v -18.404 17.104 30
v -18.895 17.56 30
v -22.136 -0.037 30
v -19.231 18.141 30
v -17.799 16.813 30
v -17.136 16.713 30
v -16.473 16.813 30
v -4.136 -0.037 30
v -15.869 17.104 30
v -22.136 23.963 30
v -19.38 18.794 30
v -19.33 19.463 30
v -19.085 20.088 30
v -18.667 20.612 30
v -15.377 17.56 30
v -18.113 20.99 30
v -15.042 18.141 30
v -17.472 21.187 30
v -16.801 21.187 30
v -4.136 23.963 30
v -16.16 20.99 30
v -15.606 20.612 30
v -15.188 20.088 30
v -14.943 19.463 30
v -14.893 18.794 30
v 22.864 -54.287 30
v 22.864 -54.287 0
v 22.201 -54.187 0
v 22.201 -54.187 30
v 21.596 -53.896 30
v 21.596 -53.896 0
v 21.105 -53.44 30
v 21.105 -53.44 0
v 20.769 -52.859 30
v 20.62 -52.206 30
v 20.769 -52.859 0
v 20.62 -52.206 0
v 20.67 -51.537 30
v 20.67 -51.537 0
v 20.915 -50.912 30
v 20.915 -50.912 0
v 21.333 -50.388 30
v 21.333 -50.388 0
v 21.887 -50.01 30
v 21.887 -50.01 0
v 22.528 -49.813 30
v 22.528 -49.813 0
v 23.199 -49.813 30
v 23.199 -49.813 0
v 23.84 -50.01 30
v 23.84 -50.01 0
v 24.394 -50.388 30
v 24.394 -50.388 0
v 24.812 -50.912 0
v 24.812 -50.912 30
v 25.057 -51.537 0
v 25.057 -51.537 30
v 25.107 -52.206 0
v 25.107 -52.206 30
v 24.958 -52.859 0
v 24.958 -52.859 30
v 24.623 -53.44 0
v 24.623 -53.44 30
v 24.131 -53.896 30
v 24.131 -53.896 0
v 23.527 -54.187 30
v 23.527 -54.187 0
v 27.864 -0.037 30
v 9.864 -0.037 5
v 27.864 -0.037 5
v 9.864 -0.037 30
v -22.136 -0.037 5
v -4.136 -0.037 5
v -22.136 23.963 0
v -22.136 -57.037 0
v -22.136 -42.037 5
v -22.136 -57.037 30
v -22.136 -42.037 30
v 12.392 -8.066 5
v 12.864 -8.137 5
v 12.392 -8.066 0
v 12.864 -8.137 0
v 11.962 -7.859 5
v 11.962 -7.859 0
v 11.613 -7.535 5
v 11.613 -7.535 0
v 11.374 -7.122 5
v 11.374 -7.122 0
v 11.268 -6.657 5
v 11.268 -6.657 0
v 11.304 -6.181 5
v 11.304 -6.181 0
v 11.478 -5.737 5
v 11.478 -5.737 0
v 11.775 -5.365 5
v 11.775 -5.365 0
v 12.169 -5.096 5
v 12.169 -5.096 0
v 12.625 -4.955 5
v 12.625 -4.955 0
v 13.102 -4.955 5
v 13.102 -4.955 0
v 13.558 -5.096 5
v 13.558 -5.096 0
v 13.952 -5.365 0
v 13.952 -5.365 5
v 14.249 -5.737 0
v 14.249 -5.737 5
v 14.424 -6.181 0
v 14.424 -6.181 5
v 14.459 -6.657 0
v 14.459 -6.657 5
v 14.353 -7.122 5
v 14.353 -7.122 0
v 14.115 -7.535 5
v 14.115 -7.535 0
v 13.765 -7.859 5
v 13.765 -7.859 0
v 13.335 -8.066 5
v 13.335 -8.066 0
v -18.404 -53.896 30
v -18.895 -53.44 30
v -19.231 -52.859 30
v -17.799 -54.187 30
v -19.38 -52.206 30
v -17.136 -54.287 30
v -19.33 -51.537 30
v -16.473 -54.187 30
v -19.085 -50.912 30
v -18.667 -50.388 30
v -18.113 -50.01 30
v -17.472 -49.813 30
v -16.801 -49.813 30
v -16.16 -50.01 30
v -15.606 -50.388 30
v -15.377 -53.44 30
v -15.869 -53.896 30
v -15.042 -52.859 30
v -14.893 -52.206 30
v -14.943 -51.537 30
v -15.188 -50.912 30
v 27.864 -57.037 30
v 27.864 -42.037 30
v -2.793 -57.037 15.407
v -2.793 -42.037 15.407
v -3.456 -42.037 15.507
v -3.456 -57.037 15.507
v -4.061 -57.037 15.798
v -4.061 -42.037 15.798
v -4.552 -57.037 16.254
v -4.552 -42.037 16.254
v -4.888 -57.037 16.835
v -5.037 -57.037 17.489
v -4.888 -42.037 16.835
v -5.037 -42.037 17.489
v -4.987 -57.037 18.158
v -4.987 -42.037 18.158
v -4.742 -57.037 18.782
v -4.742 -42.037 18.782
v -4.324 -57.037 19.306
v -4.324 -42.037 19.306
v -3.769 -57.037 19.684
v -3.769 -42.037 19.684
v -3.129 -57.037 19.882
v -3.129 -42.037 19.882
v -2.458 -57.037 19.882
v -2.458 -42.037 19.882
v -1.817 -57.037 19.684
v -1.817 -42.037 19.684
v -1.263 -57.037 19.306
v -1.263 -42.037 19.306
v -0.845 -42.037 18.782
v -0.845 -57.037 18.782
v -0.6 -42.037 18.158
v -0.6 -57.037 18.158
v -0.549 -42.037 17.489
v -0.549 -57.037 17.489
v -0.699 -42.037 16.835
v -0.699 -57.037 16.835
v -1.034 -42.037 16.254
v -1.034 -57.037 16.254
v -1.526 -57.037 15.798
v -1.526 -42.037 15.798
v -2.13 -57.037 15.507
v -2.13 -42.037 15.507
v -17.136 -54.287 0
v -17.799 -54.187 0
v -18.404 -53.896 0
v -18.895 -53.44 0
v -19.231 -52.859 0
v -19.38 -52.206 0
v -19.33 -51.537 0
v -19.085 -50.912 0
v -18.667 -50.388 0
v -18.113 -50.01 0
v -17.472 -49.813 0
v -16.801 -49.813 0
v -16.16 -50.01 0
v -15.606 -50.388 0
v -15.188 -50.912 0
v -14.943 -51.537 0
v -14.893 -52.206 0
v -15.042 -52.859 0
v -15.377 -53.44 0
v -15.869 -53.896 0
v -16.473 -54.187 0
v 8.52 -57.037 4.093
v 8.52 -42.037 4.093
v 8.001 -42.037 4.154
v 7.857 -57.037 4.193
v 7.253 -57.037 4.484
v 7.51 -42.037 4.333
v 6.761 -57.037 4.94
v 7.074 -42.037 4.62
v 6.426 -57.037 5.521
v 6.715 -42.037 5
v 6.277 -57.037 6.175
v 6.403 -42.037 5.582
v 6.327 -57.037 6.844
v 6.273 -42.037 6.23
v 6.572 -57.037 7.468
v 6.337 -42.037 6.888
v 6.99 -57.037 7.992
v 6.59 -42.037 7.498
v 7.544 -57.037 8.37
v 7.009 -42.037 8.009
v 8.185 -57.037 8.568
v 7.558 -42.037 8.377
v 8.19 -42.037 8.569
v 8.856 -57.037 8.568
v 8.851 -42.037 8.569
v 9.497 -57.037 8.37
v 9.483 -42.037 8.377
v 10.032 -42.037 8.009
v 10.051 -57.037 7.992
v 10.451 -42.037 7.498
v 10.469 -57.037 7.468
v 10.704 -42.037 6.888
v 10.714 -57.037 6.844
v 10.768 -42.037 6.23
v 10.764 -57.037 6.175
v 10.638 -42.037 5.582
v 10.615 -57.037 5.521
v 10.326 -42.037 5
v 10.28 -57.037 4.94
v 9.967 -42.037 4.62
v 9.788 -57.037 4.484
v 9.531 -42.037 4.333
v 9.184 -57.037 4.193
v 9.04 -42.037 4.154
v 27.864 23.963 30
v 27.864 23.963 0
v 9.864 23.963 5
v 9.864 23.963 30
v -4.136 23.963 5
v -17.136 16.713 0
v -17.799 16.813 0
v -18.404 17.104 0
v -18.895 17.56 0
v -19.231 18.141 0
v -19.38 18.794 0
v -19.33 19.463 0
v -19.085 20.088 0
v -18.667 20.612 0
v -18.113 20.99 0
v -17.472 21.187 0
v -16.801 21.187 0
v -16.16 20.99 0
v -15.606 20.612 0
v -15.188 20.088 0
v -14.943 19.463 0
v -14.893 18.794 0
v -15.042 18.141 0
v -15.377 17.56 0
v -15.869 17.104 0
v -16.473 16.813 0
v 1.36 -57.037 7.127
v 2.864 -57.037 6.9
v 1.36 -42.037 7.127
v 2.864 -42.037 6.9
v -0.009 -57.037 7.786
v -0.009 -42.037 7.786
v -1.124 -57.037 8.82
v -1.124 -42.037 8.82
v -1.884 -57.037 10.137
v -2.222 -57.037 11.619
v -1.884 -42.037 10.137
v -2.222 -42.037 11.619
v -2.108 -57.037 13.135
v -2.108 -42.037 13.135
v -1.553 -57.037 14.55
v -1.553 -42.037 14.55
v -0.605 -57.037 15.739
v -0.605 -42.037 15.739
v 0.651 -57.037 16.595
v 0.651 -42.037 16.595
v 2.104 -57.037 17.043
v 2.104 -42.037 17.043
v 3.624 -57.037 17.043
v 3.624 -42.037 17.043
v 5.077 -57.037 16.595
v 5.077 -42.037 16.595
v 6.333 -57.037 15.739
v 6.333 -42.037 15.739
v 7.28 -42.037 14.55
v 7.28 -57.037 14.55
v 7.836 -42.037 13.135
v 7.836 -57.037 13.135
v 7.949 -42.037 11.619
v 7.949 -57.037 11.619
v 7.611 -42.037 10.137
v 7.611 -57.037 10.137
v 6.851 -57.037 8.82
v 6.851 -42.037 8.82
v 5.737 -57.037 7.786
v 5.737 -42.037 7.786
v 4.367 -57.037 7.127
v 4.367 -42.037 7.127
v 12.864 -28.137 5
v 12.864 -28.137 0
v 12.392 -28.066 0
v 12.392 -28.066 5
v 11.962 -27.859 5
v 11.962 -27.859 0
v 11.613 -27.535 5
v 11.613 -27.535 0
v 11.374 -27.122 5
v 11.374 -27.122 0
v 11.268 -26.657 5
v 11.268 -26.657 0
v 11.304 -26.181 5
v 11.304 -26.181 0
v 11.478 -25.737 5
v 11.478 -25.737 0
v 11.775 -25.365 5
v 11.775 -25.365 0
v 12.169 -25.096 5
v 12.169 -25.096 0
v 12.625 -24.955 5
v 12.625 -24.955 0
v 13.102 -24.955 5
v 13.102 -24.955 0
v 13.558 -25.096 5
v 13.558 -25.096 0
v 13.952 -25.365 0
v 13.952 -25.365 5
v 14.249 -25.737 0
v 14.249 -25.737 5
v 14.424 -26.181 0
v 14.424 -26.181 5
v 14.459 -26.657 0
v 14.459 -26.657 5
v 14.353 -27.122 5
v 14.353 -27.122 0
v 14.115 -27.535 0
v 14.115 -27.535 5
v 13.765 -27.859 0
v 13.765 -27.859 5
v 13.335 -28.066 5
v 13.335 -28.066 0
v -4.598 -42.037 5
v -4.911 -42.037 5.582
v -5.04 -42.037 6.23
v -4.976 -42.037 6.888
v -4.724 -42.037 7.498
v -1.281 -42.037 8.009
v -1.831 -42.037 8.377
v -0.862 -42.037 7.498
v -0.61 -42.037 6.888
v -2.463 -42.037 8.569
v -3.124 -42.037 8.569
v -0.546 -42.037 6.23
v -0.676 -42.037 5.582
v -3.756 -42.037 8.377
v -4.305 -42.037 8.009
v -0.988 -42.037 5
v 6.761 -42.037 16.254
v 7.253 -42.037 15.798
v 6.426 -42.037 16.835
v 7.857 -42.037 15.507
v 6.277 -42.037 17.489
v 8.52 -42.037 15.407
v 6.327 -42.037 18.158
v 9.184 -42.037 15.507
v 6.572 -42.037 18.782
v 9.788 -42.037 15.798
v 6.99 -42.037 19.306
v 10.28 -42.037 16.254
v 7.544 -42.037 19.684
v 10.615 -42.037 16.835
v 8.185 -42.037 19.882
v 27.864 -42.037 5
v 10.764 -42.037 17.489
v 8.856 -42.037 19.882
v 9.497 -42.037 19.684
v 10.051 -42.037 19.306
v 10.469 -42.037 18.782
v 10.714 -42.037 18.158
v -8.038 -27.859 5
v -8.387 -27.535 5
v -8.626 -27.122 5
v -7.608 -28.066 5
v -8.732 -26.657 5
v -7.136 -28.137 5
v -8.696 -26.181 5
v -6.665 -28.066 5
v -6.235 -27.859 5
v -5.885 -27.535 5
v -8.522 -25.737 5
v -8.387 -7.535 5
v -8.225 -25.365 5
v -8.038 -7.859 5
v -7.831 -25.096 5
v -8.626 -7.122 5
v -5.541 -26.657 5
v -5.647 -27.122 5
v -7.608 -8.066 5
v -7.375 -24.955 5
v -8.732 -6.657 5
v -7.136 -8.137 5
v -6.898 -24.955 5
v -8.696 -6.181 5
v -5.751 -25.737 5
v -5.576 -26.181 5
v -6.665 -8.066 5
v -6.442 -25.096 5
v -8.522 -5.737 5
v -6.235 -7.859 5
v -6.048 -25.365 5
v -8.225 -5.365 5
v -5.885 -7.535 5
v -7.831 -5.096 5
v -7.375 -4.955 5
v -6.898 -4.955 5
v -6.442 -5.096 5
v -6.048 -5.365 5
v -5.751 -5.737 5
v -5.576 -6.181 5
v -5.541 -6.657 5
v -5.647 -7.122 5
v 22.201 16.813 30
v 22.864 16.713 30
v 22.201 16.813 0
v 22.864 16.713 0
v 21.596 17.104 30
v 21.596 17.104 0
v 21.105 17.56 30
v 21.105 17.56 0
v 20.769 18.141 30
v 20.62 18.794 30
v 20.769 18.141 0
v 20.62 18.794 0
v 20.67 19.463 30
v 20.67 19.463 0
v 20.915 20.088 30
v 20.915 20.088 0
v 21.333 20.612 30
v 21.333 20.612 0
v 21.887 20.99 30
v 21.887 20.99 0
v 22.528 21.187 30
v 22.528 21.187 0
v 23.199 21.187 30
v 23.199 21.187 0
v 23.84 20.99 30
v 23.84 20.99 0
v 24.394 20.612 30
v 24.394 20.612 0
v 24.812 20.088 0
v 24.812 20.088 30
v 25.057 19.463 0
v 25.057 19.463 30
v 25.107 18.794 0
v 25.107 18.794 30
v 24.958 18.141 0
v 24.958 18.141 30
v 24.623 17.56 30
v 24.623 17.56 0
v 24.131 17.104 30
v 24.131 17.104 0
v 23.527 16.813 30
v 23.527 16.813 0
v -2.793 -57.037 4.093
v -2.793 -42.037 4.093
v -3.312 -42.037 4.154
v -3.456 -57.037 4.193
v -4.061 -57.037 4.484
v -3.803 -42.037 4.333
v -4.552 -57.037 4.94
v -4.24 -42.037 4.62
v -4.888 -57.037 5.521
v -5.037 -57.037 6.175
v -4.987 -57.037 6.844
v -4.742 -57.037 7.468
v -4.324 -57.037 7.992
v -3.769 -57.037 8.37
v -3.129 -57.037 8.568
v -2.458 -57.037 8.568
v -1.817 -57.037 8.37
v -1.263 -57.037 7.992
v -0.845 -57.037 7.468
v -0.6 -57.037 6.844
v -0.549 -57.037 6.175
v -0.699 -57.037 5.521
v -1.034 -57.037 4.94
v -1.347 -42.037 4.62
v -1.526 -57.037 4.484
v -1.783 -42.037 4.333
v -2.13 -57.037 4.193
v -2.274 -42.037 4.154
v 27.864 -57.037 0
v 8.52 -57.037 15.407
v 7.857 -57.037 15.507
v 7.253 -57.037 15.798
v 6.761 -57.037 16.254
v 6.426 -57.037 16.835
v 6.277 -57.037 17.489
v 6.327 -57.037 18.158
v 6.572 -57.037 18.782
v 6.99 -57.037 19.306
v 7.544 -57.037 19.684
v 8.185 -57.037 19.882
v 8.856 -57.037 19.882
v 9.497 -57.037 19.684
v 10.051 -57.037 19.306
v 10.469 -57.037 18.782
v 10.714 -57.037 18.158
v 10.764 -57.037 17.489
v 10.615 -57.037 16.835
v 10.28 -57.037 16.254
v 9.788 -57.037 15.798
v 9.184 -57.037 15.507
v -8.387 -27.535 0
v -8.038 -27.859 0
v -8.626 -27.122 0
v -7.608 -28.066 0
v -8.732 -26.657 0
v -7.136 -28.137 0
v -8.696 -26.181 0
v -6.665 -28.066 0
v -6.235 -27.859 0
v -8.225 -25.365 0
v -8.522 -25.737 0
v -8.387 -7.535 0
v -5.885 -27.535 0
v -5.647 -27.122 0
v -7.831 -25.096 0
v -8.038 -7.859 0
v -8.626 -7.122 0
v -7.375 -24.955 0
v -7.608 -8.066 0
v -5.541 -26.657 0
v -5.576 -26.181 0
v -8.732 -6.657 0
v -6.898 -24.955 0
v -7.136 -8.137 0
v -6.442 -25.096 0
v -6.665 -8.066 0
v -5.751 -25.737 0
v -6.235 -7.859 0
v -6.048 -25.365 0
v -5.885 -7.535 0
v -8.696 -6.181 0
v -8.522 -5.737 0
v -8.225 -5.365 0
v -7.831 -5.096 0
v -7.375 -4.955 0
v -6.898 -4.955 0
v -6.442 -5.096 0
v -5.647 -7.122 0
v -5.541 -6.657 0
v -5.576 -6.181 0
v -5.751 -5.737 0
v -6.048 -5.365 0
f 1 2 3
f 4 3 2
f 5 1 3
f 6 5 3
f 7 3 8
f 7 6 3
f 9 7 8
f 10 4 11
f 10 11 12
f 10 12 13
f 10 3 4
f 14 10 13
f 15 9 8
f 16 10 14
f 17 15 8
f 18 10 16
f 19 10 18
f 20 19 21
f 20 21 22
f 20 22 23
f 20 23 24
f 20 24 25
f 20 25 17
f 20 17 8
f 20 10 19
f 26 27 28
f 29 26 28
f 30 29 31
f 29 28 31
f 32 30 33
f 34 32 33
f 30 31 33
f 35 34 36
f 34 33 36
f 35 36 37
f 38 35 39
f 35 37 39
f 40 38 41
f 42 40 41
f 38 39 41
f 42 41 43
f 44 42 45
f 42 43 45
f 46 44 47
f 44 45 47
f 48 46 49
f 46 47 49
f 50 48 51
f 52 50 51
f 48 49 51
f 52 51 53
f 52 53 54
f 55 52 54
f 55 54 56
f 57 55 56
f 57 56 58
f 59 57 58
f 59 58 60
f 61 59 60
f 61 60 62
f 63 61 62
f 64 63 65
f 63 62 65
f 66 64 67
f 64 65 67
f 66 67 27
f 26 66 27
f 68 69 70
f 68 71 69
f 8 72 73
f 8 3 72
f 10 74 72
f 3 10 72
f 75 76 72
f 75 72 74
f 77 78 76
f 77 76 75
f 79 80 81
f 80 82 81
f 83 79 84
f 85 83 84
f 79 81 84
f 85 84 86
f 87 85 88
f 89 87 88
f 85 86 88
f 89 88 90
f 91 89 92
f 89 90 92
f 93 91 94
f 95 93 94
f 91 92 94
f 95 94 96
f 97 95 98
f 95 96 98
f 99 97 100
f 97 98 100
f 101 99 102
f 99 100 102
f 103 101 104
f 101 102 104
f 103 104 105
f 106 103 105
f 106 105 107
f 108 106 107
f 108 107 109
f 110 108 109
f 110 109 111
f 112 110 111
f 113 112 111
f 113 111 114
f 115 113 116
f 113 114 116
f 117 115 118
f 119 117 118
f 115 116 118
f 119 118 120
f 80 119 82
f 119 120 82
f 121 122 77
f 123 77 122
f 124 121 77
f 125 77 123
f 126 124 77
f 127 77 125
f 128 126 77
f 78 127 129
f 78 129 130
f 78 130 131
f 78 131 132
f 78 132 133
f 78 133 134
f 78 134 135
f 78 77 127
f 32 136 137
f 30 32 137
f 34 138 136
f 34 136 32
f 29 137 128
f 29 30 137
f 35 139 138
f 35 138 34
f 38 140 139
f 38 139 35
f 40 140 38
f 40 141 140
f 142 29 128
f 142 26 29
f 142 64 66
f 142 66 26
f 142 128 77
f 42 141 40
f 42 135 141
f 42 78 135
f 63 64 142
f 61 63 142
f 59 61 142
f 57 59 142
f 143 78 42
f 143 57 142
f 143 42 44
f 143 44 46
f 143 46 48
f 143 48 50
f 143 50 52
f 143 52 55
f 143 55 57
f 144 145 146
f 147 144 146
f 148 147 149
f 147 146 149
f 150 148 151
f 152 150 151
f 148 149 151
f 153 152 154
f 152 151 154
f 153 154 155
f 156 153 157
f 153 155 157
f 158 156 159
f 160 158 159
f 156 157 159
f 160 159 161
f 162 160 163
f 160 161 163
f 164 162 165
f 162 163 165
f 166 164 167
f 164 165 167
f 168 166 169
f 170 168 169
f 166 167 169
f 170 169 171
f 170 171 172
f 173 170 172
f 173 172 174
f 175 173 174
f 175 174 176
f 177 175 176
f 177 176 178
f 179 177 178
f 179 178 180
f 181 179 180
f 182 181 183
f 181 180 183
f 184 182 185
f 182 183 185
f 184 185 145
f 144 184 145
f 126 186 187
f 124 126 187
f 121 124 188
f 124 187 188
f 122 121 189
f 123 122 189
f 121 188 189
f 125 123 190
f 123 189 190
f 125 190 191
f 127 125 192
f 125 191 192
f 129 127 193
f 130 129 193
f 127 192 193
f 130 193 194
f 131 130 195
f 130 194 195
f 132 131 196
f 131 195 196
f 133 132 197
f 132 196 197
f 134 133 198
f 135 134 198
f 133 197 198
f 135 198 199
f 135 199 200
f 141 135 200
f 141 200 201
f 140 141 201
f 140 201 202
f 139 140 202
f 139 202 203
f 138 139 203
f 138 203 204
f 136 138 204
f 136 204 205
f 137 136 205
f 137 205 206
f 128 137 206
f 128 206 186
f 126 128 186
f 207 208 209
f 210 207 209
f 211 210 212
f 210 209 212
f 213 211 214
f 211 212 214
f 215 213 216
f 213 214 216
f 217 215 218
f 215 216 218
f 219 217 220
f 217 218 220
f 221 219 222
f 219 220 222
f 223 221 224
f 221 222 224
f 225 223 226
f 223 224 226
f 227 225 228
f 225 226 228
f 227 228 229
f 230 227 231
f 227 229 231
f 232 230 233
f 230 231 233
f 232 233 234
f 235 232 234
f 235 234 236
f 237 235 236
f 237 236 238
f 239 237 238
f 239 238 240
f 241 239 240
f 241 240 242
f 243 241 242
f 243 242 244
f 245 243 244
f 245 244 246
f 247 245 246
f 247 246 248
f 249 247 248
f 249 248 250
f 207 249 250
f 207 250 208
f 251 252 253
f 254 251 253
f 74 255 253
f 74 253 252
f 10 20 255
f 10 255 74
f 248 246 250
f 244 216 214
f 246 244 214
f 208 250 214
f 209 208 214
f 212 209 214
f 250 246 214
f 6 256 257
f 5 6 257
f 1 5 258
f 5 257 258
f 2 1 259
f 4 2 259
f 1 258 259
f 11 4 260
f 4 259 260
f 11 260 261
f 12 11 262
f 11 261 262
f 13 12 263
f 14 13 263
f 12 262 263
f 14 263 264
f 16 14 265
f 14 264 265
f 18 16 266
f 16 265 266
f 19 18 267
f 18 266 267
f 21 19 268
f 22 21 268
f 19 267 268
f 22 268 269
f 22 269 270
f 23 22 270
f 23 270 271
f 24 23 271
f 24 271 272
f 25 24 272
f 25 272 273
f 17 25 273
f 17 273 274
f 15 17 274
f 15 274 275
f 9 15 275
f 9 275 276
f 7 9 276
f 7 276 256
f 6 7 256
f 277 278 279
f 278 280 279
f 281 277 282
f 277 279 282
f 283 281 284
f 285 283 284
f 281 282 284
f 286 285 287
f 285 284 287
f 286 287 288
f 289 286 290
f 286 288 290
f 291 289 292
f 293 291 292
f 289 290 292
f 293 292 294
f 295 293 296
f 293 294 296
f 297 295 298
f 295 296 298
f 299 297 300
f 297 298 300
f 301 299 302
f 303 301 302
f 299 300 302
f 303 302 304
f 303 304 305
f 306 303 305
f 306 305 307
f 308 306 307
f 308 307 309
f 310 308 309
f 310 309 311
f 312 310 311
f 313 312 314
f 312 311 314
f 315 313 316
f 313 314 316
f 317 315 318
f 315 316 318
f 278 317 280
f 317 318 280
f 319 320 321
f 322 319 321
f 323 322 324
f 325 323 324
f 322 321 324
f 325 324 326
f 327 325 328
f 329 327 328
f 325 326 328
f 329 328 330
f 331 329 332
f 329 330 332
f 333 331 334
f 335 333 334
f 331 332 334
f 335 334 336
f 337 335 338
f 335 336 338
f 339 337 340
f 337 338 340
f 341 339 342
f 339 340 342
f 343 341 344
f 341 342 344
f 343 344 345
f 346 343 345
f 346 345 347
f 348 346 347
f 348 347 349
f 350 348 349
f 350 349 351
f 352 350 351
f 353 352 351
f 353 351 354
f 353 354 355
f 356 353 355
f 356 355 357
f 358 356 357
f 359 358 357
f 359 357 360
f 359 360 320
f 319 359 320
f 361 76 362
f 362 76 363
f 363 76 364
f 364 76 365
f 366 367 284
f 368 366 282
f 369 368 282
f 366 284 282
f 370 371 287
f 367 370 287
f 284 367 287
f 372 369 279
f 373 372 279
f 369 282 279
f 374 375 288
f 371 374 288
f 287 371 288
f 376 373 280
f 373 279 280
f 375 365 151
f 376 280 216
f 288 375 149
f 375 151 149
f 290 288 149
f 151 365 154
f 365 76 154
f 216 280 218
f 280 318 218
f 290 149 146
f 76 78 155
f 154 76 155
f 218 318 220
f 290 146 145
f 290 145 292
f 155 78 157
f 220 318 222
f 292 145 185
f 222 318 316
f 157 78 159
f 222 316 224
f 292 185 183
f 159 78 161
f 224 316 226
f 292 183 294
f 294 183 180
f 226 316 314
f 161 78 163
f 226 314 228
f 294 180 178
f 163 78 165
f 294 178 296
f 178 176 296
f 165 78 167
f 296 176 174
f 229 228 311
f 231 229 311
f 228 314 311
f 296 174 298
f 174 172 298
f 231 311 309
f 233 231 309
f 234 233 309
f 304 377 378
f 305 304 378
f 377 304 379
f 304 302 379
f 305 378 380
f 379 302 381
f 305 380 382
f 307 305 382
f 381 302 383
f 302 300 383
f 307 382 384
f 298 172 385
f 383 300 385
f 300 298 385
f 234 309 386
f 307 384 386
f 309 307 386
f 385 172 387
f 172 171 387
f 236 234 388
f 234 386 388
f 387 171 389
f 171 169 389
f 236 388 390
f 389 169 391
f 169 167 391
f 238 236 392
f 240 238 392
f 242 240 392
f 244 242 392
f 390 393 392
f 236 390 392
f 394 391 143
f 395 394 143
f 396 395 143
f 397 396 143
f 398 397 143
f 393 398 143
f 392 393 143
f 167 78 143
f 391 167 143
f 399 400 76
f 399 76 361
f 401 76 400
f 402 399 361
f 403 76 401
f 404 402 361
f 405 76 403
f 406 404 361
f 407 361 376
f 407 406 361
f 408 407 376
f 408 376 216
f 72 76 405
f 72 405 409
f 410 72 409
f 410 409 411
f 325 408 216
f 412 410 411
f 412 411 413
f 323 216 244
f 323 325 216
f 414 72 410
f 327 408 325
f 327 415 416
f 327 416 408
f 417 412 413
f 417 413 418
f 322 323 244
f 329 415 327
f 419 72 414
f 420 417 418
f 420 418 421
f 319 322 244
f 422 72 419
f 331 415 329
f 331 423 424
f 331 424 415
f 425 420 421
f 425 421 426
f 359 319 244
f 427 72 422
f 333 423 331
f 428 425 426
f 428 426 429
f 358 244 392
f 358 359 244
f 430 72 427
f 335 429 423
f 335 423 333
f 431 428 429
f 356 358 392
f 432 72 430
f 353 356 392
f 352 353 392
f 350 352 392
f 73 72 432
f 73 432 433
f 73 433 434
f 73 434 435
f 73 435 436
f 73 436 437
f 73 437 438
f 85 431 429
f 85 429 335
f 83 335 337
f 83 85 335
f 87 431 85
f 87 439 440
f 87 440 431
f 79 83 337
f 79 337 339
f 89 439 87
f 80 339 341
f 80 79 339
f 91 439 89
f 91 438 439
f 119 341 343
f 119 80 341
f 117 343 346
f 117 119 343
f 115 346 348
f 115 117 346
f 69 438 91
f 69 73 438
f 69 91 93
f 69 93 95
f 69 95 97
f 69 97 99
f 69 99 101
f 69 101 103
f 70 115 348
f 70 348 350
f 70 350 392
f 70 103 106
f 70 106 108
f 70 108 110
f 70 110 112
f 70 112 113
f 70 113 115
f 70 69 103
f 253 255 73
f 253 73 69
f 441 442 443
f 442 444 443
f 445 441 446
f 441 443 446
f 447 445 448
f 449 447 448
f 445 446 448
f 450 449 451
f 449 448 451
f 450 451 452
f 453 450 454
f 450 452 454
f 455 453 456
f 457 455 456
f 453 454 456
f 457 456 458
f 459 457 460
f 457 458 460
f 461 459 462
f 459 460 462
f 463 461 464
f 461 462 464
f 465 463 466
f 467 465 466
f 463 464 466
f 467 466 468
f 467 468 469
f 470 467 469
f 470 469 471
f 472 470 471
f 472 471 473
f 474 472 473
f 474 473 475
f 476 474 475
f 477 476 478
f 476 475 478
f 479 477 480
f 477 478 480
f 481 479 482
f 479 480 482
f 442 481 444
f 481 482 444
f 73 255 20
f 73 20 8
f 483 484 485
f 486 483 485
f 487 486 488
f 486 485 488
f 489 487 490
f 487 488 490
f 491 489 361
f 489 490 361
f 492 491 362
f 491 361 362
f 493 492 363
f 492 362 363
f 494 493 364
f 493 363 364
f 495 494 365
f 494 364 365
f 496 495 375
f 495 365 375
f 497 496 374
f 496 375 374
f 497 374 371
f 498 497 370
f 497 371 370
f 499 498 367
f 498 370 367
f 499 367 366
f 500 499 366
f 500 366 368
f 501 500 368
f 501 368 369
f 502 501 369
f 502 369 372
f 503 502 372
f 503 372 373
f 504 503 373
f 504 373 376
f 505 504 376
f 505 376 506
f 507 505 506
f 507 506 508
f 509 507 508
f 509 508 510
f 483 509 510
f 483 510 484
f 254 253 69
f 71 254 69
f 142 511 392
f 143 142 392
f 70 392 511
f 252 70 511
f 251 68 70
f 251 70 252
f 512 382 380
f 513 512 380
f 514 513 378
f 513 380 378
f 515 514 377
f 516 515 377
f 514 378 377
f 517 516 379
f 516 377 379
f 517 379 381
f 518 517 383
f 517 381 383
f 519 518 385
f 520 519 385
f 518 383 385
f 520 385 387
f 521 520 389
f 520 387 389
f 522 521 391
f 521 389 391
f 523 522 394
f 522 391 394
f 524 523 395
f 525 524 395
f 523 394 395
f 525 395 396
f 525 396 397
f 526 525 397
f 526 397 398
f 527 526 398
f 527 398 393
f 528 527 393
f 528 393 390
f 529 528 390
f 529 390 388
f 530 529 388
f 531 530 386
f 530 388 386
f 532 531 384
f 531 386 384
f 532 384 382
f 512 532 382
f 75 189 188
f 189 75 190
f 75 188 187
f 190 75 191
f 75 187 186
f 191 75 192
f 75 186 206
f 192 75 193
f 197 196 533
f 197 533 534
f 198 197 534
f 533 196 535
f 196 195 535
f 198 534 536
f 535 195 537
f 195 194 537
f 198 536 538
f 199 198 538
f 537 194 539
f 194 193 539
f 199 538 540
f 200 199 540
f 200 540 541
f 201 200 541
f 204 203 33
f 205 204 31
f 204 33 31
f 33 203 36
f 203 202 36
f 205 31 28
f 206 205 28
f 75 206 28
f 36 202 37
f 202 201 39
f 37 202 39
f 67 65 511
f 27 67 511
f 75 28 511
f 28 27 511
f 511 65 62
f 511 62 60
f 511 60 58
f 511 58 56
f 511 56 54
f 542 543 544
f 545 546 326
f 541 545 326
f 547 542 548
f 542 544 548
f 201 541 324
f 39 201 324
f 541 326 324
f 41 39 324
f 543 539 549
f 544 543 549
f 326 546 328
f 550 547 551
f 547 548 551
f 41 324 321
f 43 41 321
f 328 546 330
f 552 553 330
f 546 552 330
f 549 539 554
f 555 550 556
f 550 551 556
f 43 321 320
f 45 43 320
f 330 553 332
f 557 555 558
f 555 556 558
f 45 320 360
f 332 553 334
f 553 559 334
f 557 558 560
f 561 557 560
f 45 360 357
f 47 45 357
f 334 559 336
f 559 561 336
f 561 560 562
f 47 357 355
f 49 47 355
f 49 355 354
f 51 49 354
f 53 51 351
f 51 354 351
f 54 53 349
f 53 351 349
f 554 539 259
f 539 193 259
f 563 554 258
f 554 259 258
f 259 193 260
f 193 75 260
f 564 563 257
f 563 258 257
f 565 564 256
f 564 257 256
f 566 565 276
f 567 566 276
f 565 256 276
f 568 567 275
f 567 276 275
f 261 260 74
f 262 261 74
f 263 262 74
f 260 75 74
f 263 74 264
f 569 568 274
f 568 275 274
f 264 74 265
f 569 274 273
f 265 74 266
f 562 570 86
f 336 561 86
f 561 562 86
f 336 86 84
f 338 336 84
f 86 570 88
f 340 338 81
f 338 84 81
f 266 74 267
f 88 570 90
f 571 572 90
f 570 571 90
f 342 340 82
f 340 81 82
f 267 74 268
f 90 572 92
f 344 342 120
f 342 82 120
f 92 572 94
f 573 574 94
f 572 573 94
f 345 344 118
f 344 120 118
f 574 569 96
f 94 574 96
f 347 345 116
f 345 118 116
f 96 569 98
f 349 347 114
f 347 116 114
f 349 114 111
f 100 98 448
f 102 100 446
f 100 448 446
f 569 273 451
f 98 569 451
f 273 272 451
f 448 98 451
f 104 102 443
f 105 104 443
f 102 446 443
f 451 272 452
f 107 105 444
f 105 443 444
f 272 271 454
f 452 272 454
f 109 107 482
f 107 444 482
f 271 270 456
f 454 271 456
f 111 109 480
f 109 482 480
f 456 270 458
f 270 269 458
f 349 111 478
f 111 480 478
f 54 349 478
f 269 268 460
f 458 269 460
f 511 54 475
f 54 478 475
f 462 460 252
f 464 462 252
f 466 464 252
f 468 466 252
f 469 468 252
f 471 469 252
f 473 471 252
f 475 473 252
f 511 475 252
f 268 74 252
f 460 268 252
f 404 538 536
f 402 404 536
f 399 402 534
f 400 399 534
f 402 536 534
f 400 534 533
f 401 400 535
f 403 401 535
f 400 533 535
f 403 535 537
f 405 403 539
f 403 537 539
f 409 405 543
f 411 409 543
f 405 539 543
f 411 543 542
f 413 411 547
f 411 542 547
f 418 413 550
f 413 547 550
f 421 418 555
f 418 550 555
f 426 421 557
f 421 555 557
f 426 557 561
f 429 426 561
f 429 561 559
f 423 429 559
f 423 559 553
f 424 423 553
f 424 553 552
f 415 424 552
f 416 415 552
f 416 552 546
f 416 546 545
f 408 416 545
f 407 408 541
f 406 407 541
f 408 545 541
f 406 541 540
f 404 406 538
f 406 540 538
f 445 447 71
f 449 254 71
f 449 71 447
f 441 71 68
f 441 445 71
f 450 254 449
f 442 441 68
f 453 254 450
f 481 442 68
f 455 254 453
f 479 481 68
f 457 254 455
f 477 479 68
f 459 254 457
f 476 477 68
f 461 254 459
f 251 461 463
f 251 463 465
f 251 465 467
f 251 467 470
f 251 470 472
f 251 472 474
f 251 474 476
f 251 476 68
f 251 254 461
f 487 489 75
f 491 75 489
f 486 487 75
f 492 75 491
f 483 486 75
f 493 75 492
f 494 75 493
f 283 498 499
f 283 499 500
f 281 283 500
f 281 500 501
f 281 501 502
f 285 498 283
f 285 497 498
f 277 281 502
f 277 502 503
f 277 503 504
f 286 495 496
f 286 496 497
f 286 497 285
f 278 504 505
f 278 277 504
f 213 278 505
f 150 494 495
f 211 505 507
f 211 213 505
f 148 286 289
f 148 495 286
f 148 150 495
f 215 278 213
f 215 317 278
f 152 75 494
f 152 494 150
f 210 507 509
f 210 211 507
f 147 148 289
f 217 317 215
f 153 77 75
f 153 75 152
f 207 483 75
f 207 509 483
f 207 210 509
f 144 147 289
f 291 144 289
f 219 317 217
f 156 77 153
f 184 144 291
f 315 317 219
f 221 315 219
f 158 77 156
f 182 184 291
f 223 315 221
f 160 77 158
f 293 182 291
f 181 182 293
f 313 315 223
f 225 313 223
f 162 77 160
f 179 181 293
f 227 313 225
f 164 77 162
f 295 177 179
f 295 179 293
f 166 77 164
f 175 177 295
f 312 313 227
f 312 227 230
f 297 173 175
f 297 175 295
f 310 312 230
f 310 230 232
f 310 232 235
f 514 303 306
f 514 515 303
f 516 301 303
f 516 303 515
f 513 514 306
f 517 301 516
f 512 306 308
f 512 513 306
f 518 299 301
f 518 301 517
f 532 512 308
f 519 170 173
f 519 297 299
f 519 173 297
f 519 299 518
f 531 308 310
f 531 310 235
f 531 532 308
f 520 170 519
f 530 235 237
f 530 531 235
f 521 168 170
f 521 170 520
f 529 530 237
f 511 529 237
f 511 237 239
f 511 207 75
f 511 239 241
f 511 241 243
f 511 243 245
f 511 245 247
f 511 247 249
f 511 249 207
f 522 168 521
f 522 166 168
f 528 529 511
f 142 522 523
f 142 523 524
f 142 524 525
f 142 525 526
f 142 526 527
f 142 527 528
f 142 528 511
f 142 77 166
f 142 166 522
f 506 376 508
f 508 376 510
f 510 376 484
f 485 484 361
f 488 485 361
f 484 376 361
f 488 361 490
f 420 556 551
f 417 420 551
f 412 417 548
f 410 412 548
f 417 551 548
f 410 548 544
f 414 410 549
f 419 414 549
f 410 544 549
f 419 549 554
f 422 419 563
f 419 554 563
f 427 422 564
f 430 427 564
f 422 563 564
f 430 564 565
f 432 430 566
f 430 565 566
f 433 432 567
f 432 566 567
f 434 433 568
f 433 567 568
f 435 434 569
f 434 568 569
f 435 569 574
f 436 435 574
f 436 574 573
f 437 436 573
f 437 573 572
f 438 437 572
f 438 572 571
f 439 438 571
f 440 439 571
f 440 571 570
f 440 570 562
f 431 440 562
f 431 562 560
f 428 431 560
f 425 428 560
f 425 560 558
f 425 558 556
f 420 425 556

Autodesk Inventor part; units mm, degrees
ref_plane "YZ Plane" through (0, 0, 0) normal (1, 0, 0) x (0, 1, 0)
ref_plane "Work Plane1" through (-22.1363, -57.0374, 30) normal (0, 0, 1) x (1, 0, 0)
sketch "Sketch1" plane through (-22.1363, -57.0374, 30) normal (0, 0, 1) x (1, 0, 0)
  line L0 (0, 0) -> (50, 0)
  line L1 (50, 0) -> (50, 81)
  line L2 (50, 81) -> (0, 81)
  line L3 (0, 81) -> (0, 0)
  line L4 (25, 81) -> (25, 0) construction
  line L5 (0, 40.5) -> (50, 40.5) construction
  circle A0 centre (5, 76) radius 2.25
  circle A1 centre (45, 5) radius 2.25
  circle A2 centre (45, 76) radius 2.25
  circle A3 centre (5, 5) radius 2.25
  line L6 (18, 81) -> (18, 0)
  line L7 (32, 81) -> (32, 0)
  line L8 (0, 15) -> (50, 15)
  line L9 (0, 57) -> (50, 57)
  circle A4 centre (35, 30.5) radius 1.6
  circle A5 centre (15, 50.5) radius 1.6
  circle A6 centre (15, 30.5) radius 1.6
  circle A7 centre (35, 50.5) radius 1.6
  point P0 (18, 57)
  point P1 (32, 57)
  dimension "d0" = 50
  dimension "d1" = 81
  dimension "d2" = 5
  dimension "d3" = 5
  dimension "d5" = 4.5
  dimension "d27" = 14
  dimension "d28" = 24
  dimension "d29" = 15
  dimension "d30" = 20
  dimension "d31" = 20
  dimension "d32" = 3.2
ref_plane "Work Plane4" through (-22.1363, -57.0374, 0) normal (0, -1, 0) x (1, 0, 0)
sketch "Sketch2" plane through (-22.1363, -57.0374, 0) normal (0, -1, 0) x (1, 0, 0)
  line L0 (0, 0) -> (50, 0)
  line L1 (50, 0) -> (50, 30)
  line L2 (50, 30) -> (0, 30)
  line L3 (0, 30) -> (0, 0)
  line L4 (25, 0) -> (25, 30) construction
  line L5 (0, 12) -> (50, 12) construction
  circle A0 centre (25, 12) radius 5.1
  circle A1 centre (30.6569, 17.6569) radius 2.25
  line L6 (25, 12) -> (30.6569, 17.6569) construction
  circle A2 centre (19.3431, 6.3431) radius 2.25
  circle A3 centre (30.6569, 6.3431) radius 2.25
  circle A4 centre (19.3431, 17.6569) radius 2.25
  dimension "d17" = 50
  dimension "d18" = 30
  dimension "d21" = 12
  dimension "d22" = 10.2
  dimension "d24" = 4.5
  dimension "d25" = 8
  dimension "d26" = 45
extrude "Extrusion1" add sketch "Sketch1" against normal blind 30 contours L3 L8 L6 L0 | L6 L8 L7 L0 | L3 L9 L6 L8 | L7 L8 L1 L0 | L6 L9 L7 L8 | L3 L2 L6 L9 | L7 L9 L1 L8 | L6 L2 L7 L9 | L7 L2 L1 L9 | A0 | A1 | A2 | A3 | A4 | A5 | A6 | A7
hole "Hole2" at (-7.1363, -6.5374, 30) at (12.8637, -6.5374, 30) at (12.8637, -26.5374, 30) at (-7.1363, -26.5374, 30) direction (0, 0, -1) diameter 3.2 end through all
hole "Hole3" at (-17.1363, 18.9626, 30) at (22.8637, 18.9626, 30) at (22.8637, -52.0374, 30) at (-17.1363, -52.0374, 30) direction (0, 0, -1) diameter 4.5 end through all
hole "Hole4" at (-2.7932, -57.0374, 17.6569) at (8.5205, -57.0374, 17.6569) at (8.5205, -57.0374, 6.3431) at (-2.7932, -57.0374, 6.3431) direction (0, 1, 0) diameter 4.5 depth 15
hole "Hole5" at (2.8637, -57.0374, 12) direction (0, 1, 0) diameter 10.2 end through all
extrude "Extrusion2" cut sketch "Sketch1" against normal blind 25 contours L3 L9 L6 L8 | L6 L9 L7 L8 | L7 L9 L1 L8 | L6 L2 L7 L9
properties part number "y_slider_bracket" material "PC/ABS Plastic"
